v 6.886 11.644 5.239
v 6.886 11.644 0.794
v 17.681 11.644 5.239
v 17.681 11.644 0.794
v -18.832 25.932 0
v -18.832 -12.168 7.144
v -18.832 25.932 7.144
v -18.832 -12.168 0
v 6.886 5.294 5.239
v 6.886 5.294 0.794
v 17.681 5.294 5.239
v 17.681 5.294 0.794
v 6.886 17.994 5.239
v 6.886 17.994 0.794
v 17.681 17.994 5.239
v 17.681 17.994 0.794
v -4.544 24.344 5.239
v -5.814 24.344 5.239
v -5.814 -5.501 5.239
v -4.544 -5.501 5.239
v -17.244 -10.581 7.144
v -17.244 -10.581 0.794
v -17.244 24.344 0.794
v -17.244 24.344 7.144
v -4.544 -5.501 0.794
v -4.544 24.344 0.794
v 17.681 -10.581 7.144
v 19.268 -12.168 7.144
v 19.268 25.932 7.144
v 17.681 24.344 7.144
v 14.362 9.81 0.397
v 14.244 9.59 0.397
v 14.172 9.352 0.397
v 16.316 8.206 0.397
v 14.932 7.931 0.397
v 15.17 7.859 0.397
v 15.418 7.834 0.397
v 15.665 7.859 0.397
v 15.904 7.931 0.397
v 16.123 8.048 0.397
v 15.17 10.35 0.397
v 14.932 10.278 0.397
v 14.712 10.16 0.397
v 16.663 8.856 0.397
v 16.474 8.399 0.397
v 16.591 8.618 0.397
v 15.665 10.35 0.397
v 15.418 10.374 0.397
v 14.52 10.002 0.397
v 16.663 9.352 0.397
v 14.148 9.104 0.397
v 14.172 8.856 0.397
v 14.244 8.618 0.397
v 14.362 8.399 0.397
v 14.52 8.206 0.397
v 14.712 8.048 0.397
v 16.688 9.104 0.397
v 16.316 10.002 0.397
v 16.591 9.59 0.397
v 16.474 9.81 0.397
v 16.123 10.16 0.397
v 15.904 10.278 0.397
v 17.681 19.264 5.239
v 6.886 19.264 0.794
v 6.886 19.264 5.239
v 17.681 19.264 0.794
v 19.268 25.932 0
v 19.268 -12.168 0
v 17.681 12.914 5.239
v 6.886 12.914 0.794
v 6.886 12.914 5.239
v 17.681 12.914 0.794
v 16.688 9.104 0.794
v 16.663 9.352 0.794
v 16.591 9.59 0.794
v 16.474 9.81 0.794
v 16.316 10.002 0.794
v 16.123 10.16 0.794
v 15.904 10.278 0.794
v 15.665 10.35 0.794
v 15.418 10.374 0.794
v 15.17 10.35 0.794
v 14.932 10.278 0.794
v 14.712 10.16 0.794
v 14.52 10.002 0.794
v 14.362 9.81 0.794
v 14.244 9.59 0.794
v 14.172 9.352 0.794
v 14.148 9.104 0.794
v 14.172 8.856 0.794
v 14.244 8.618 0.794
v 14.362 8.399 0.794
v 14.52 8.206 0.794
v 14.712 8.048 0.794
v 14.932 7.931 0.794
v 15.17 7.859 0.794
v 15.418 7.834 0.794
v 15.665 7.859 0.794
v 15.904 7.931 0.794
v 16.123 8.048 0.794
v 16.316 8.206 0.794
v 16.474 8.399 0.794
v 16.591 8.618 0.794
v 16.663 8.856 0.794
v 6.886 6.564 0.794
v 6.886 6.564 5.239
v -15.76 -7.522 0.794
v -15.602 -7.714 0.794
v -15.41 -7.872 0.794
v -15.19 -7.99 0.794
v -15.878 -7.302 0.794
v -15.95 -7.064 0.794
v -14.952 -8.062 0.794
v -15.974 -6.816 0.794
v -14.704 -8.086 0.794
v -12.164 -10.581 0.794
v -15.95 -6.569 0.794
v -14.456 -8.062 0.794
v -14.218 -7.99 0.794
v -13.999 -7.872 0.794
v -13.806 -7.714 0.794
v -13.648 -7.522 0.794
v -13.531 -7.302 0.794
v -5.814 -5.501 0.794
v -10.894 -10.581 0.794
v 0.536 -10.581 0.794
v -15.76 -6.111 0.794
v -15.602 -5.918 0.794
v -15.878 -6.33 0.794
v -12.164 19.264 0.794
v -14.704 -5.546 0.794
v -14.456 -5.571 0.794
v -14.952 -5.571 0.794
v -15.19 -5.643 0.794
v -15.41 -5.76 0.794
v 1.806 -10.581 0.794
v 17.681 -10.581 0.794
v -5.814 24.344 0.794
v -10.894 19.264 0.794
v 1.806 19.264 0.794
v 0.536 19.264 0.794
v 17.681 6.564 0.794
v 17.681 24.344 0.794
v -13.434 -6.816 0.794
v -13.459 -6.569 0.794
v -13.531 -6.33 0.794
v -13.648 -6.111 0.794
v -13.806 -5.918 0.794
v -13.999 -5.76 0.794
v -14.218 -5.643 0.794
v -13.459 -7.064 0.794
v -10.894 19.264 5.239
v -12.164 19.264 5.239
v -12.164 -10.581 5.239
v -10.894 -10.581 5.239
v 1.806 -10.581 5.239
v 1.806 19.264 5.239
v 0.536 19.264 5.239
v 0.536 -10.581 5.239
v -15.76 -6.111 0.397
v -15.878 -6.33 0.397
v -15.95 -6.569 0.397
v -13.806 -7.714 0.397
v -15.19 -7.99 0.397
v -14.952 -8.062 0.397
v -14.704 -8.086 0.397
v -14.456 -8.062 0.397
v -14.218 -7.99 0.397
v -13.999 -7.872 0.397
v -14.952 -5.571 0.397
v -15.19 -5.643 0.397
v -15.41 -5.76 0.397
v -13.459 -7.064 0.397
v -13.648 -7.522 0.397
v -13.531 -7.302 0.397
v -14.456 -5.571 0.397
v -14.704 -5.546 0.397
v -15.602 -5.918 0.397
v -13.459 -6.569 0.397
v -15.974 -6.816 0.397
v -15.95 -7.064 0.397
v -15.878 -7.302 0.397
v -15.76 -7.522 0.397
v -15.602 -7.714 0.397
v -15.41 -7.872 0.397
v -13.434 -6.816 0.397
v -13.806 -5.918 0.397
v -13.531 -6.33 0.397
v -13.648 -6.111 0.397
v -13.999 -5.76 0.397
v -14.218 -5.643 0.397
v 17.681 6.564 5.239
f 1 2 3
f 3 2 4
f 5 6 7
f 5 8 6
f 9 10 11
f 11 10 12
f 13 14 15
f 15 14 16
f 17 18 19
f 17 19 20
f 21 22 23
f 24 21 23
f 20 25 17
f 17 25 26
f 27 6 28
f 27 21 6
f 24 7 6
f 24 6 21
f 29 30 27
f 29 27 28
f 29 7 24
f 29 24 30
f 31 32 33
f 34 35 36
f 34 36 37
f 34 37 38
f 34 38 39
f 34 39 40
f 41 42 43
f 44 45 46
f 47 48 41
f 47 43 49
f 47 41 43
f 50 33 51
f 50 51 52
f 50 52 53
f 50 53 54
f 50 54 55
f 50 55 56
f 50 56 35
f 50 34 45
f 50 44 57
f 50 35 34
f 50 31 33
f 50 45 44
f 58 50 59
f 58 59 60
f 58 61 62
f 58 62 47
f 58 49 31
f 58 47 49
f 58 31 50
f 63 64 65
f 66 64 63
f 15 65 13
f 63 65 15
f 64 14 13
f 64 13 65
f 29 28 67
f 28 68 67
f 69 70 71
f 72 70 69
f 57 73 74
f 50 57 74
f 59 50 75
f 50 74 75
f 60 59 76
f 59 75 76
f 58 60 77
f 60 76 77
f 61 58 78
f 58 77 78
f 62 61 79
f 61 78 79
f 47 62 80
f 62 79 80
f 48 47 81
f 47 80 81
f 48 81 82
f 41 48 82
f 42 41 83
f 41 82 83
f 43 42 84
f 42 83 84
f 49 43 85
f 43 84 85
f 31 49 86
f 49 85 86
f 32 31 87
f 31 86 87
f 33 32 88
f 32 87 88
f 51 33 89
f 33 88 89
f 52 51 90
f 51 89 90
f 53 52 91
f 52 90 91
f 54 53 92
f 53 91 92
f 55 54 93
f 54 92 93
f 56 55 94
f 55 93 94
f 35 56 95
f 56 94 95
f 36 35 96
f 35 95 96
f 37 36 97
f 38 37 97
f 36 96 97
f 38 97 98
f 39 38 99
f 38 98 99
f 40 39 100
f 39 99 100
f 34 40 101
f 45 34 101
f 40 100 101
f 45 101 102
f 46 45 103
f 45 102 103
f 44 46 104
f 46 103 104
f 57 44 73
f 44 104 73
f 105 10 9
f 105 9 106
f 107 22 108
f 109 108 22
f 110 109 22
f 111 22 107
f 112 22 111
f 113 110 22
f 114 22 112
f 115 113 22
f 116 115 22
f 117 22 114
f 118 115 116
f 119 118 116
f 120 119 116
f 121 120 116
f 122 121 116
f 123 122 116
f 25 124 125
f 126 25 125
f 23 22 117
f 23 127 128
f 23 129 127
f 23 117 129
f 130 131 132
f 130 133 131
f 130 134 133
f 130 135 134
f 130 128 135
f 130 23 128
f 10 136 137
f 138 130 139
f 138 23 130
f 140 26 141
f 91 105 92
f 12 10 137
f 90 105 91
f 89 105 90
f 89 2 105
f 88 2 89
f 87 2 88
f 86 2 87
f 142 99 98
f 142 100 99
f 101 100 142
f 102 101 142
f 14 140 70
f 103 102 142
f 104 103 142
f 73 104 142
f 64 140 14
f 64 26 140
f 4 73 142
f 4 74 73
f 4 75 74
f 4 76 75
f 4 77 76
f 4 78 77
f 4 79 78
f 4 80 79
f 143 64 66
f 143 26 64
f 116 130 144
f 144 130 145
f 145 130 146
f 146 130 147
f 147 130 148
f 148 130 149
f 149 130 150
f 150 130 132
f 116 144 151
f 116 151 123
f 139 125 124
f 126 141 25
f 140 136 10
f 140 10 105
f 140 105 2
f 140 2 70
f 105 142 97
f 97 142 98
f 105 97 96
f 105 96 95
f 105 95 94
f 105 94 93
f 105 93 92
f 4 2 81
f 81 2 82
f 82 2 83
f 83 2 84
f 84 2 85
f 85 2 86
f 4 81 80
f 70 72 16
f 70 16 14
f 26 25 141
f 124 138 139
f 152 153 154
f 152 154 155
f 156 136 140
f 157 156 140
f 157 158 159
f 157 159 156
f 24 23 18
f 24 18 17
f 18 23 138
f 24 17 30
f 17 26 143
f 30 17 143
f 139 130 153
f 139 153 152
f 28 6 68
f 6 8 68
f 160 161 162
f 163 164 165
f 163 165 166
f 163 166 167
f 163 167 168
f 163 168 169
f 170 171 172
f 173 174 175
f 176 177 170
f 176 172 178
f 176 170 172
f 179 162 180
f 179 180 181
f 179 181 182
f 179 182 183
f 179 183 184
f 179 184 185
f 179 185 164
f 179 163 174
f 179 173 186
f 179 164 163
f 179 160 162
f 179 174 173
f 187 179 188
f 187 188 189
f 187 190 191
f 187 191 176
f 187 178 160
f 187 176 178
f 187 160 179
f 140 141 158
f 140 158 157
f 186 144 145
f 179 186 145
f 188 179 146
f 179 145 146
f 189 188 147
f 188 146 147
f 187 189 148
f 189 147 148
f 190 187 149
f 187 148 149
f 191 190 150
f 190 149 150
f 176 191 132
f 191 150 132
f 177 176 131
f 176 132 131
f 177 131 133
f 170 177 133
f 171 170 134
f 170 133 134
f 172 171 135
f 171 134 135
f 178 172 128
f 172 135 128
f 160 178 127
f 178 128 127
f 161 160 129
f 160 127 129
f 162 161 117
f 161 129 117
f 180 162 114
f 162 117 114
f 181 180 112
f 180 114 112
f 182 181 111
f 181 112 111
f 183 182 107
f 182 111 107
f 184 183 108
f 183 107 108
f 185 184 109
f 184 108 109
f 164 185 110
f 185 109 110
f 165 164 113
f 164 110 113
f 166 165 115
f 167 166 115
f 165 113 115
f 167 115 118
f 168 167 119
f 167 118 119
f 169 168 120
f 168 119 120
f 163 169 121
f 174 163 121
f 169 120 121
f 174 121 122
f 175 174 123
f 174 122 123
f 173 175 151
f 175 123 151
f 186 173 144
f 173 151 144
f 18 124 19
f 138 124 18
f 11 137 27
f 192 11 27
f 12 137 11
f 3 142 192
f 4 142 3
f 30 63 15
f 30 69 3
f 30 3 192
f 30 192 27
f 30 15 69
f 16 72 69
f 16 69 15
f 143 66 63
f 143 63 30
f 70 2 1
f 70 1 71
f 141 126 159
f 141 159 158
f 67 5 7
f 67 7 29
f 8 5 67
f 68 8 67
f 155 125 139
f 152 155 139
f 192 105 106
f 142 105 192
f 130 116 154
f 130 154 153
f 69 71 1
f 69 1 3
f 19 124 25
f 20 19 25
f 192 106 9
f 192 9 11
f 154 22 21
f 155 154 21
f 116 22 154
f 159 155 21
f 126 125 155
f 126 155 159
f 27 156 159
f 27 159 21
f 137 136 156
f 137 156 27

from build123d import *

# Parameters (mm, degrees)
F0_W      = 38.1
F0_H      = 38.1
F1_DEPTH  = 0.79375
F2_W      = 38.1
F2_H      = 38.1
F2_W_2    = 34.925
F2_H_2    = 34.925
F3_DEPTH  = 6.35
F4_W      = 1.27
F4_H      = 29.845
F4_W_2    = 10.795
F4_H_2    = 1.27
F5_DEPTH  = 4.445
F6_W      = 10.795
F6_H      = 1.27
F7_DEPTH  = 4.445
F8_R      = 1.27
F9_DEPTH  = 0.396875
F10_R     = 1.27
F11_DEPTH = 0.396875
F12_DEPTH = 0.396875


with BuildPart() as f1:
    # F0 (on Top) → F1 (new body)
    with BuildSketch(Plane.XY):
        with Locations((0.218246, 6.881682)):
            Rectangle(F0_W, F0_H)
    extrude(amount=F1_DEPTH)

    # F2 (on face) → F3 (join)
    with BuildSketch(Plane.XY.offset(0.79375)):
        with Locations((0.218246, 6.881682)):
            Rectangle(F2_W, F2_H)
        with Locations((0.218246, 6.881682)):
            Rectangle(F2_W_2, F2_H_2, mode=Mode.SUBTRACT)
    extrude(amount=F3_DEPTH)

    # F4 (on face) → F5 (join)
    with BuildSketch(Plane.XY.offset(0.79375)):
        with Locations((-11.529254, 4.341682)):
            Rectangle(F4_W, F4_H)
        with Locations((-5.179254, 9.421682)):
            Rectangle(F4_W, F4_H)
        with Locations((1.170746, 4.341682)):
            Rectangle(F4_W, F4_H)
        with Locations((12.283246, 12.279182)):
            Rectangle(F4_W_2, F4_H_2)
        with Locations((12.283246, 18.629182)):
            Rectangle(F4_W_2, F4_H_2)
    extrude(amount=F5_DEPTH)

    # F6 (on face) → F7 (join)
    with BuildSketch(Plane.XY.offset(0.79375)):
        with Locations((12.283246, 5.929182)):
            Rectangle(F6_W, F6_H)
    extrude(amount=F7_DEPTH)

    # F8 (on face) → F9 (cut)
    with BuildSketch(Plane.XY.offset(0.79375)):
        with Locations((-14.704254, -6.816329)):
            Circle(F8_R)
    extrude(amount=F9_DEPTH, mode=Mode.SUBTRACT)

    # F10 (on face) → F11 (cut)
    with BuildSketch(Plane.XY.offset(0.79375)):
        with Locations((15.417561, 9.104182)):
            Circle(F10_R)
    extrude(amount=-F11_DEPTH, mode=Mode.SUBTRACT)

    # F8 (on face) → F12 (cut)
    with BuildSketch(Plane.XY.offset(0.79375)):
        with Locations((-14.704254, -6.816329)):
            Circle(F8_R)
    extrude(amount=-F12_DEPTH, mode=Mode.SUBTRACT)


solid = f1.part
